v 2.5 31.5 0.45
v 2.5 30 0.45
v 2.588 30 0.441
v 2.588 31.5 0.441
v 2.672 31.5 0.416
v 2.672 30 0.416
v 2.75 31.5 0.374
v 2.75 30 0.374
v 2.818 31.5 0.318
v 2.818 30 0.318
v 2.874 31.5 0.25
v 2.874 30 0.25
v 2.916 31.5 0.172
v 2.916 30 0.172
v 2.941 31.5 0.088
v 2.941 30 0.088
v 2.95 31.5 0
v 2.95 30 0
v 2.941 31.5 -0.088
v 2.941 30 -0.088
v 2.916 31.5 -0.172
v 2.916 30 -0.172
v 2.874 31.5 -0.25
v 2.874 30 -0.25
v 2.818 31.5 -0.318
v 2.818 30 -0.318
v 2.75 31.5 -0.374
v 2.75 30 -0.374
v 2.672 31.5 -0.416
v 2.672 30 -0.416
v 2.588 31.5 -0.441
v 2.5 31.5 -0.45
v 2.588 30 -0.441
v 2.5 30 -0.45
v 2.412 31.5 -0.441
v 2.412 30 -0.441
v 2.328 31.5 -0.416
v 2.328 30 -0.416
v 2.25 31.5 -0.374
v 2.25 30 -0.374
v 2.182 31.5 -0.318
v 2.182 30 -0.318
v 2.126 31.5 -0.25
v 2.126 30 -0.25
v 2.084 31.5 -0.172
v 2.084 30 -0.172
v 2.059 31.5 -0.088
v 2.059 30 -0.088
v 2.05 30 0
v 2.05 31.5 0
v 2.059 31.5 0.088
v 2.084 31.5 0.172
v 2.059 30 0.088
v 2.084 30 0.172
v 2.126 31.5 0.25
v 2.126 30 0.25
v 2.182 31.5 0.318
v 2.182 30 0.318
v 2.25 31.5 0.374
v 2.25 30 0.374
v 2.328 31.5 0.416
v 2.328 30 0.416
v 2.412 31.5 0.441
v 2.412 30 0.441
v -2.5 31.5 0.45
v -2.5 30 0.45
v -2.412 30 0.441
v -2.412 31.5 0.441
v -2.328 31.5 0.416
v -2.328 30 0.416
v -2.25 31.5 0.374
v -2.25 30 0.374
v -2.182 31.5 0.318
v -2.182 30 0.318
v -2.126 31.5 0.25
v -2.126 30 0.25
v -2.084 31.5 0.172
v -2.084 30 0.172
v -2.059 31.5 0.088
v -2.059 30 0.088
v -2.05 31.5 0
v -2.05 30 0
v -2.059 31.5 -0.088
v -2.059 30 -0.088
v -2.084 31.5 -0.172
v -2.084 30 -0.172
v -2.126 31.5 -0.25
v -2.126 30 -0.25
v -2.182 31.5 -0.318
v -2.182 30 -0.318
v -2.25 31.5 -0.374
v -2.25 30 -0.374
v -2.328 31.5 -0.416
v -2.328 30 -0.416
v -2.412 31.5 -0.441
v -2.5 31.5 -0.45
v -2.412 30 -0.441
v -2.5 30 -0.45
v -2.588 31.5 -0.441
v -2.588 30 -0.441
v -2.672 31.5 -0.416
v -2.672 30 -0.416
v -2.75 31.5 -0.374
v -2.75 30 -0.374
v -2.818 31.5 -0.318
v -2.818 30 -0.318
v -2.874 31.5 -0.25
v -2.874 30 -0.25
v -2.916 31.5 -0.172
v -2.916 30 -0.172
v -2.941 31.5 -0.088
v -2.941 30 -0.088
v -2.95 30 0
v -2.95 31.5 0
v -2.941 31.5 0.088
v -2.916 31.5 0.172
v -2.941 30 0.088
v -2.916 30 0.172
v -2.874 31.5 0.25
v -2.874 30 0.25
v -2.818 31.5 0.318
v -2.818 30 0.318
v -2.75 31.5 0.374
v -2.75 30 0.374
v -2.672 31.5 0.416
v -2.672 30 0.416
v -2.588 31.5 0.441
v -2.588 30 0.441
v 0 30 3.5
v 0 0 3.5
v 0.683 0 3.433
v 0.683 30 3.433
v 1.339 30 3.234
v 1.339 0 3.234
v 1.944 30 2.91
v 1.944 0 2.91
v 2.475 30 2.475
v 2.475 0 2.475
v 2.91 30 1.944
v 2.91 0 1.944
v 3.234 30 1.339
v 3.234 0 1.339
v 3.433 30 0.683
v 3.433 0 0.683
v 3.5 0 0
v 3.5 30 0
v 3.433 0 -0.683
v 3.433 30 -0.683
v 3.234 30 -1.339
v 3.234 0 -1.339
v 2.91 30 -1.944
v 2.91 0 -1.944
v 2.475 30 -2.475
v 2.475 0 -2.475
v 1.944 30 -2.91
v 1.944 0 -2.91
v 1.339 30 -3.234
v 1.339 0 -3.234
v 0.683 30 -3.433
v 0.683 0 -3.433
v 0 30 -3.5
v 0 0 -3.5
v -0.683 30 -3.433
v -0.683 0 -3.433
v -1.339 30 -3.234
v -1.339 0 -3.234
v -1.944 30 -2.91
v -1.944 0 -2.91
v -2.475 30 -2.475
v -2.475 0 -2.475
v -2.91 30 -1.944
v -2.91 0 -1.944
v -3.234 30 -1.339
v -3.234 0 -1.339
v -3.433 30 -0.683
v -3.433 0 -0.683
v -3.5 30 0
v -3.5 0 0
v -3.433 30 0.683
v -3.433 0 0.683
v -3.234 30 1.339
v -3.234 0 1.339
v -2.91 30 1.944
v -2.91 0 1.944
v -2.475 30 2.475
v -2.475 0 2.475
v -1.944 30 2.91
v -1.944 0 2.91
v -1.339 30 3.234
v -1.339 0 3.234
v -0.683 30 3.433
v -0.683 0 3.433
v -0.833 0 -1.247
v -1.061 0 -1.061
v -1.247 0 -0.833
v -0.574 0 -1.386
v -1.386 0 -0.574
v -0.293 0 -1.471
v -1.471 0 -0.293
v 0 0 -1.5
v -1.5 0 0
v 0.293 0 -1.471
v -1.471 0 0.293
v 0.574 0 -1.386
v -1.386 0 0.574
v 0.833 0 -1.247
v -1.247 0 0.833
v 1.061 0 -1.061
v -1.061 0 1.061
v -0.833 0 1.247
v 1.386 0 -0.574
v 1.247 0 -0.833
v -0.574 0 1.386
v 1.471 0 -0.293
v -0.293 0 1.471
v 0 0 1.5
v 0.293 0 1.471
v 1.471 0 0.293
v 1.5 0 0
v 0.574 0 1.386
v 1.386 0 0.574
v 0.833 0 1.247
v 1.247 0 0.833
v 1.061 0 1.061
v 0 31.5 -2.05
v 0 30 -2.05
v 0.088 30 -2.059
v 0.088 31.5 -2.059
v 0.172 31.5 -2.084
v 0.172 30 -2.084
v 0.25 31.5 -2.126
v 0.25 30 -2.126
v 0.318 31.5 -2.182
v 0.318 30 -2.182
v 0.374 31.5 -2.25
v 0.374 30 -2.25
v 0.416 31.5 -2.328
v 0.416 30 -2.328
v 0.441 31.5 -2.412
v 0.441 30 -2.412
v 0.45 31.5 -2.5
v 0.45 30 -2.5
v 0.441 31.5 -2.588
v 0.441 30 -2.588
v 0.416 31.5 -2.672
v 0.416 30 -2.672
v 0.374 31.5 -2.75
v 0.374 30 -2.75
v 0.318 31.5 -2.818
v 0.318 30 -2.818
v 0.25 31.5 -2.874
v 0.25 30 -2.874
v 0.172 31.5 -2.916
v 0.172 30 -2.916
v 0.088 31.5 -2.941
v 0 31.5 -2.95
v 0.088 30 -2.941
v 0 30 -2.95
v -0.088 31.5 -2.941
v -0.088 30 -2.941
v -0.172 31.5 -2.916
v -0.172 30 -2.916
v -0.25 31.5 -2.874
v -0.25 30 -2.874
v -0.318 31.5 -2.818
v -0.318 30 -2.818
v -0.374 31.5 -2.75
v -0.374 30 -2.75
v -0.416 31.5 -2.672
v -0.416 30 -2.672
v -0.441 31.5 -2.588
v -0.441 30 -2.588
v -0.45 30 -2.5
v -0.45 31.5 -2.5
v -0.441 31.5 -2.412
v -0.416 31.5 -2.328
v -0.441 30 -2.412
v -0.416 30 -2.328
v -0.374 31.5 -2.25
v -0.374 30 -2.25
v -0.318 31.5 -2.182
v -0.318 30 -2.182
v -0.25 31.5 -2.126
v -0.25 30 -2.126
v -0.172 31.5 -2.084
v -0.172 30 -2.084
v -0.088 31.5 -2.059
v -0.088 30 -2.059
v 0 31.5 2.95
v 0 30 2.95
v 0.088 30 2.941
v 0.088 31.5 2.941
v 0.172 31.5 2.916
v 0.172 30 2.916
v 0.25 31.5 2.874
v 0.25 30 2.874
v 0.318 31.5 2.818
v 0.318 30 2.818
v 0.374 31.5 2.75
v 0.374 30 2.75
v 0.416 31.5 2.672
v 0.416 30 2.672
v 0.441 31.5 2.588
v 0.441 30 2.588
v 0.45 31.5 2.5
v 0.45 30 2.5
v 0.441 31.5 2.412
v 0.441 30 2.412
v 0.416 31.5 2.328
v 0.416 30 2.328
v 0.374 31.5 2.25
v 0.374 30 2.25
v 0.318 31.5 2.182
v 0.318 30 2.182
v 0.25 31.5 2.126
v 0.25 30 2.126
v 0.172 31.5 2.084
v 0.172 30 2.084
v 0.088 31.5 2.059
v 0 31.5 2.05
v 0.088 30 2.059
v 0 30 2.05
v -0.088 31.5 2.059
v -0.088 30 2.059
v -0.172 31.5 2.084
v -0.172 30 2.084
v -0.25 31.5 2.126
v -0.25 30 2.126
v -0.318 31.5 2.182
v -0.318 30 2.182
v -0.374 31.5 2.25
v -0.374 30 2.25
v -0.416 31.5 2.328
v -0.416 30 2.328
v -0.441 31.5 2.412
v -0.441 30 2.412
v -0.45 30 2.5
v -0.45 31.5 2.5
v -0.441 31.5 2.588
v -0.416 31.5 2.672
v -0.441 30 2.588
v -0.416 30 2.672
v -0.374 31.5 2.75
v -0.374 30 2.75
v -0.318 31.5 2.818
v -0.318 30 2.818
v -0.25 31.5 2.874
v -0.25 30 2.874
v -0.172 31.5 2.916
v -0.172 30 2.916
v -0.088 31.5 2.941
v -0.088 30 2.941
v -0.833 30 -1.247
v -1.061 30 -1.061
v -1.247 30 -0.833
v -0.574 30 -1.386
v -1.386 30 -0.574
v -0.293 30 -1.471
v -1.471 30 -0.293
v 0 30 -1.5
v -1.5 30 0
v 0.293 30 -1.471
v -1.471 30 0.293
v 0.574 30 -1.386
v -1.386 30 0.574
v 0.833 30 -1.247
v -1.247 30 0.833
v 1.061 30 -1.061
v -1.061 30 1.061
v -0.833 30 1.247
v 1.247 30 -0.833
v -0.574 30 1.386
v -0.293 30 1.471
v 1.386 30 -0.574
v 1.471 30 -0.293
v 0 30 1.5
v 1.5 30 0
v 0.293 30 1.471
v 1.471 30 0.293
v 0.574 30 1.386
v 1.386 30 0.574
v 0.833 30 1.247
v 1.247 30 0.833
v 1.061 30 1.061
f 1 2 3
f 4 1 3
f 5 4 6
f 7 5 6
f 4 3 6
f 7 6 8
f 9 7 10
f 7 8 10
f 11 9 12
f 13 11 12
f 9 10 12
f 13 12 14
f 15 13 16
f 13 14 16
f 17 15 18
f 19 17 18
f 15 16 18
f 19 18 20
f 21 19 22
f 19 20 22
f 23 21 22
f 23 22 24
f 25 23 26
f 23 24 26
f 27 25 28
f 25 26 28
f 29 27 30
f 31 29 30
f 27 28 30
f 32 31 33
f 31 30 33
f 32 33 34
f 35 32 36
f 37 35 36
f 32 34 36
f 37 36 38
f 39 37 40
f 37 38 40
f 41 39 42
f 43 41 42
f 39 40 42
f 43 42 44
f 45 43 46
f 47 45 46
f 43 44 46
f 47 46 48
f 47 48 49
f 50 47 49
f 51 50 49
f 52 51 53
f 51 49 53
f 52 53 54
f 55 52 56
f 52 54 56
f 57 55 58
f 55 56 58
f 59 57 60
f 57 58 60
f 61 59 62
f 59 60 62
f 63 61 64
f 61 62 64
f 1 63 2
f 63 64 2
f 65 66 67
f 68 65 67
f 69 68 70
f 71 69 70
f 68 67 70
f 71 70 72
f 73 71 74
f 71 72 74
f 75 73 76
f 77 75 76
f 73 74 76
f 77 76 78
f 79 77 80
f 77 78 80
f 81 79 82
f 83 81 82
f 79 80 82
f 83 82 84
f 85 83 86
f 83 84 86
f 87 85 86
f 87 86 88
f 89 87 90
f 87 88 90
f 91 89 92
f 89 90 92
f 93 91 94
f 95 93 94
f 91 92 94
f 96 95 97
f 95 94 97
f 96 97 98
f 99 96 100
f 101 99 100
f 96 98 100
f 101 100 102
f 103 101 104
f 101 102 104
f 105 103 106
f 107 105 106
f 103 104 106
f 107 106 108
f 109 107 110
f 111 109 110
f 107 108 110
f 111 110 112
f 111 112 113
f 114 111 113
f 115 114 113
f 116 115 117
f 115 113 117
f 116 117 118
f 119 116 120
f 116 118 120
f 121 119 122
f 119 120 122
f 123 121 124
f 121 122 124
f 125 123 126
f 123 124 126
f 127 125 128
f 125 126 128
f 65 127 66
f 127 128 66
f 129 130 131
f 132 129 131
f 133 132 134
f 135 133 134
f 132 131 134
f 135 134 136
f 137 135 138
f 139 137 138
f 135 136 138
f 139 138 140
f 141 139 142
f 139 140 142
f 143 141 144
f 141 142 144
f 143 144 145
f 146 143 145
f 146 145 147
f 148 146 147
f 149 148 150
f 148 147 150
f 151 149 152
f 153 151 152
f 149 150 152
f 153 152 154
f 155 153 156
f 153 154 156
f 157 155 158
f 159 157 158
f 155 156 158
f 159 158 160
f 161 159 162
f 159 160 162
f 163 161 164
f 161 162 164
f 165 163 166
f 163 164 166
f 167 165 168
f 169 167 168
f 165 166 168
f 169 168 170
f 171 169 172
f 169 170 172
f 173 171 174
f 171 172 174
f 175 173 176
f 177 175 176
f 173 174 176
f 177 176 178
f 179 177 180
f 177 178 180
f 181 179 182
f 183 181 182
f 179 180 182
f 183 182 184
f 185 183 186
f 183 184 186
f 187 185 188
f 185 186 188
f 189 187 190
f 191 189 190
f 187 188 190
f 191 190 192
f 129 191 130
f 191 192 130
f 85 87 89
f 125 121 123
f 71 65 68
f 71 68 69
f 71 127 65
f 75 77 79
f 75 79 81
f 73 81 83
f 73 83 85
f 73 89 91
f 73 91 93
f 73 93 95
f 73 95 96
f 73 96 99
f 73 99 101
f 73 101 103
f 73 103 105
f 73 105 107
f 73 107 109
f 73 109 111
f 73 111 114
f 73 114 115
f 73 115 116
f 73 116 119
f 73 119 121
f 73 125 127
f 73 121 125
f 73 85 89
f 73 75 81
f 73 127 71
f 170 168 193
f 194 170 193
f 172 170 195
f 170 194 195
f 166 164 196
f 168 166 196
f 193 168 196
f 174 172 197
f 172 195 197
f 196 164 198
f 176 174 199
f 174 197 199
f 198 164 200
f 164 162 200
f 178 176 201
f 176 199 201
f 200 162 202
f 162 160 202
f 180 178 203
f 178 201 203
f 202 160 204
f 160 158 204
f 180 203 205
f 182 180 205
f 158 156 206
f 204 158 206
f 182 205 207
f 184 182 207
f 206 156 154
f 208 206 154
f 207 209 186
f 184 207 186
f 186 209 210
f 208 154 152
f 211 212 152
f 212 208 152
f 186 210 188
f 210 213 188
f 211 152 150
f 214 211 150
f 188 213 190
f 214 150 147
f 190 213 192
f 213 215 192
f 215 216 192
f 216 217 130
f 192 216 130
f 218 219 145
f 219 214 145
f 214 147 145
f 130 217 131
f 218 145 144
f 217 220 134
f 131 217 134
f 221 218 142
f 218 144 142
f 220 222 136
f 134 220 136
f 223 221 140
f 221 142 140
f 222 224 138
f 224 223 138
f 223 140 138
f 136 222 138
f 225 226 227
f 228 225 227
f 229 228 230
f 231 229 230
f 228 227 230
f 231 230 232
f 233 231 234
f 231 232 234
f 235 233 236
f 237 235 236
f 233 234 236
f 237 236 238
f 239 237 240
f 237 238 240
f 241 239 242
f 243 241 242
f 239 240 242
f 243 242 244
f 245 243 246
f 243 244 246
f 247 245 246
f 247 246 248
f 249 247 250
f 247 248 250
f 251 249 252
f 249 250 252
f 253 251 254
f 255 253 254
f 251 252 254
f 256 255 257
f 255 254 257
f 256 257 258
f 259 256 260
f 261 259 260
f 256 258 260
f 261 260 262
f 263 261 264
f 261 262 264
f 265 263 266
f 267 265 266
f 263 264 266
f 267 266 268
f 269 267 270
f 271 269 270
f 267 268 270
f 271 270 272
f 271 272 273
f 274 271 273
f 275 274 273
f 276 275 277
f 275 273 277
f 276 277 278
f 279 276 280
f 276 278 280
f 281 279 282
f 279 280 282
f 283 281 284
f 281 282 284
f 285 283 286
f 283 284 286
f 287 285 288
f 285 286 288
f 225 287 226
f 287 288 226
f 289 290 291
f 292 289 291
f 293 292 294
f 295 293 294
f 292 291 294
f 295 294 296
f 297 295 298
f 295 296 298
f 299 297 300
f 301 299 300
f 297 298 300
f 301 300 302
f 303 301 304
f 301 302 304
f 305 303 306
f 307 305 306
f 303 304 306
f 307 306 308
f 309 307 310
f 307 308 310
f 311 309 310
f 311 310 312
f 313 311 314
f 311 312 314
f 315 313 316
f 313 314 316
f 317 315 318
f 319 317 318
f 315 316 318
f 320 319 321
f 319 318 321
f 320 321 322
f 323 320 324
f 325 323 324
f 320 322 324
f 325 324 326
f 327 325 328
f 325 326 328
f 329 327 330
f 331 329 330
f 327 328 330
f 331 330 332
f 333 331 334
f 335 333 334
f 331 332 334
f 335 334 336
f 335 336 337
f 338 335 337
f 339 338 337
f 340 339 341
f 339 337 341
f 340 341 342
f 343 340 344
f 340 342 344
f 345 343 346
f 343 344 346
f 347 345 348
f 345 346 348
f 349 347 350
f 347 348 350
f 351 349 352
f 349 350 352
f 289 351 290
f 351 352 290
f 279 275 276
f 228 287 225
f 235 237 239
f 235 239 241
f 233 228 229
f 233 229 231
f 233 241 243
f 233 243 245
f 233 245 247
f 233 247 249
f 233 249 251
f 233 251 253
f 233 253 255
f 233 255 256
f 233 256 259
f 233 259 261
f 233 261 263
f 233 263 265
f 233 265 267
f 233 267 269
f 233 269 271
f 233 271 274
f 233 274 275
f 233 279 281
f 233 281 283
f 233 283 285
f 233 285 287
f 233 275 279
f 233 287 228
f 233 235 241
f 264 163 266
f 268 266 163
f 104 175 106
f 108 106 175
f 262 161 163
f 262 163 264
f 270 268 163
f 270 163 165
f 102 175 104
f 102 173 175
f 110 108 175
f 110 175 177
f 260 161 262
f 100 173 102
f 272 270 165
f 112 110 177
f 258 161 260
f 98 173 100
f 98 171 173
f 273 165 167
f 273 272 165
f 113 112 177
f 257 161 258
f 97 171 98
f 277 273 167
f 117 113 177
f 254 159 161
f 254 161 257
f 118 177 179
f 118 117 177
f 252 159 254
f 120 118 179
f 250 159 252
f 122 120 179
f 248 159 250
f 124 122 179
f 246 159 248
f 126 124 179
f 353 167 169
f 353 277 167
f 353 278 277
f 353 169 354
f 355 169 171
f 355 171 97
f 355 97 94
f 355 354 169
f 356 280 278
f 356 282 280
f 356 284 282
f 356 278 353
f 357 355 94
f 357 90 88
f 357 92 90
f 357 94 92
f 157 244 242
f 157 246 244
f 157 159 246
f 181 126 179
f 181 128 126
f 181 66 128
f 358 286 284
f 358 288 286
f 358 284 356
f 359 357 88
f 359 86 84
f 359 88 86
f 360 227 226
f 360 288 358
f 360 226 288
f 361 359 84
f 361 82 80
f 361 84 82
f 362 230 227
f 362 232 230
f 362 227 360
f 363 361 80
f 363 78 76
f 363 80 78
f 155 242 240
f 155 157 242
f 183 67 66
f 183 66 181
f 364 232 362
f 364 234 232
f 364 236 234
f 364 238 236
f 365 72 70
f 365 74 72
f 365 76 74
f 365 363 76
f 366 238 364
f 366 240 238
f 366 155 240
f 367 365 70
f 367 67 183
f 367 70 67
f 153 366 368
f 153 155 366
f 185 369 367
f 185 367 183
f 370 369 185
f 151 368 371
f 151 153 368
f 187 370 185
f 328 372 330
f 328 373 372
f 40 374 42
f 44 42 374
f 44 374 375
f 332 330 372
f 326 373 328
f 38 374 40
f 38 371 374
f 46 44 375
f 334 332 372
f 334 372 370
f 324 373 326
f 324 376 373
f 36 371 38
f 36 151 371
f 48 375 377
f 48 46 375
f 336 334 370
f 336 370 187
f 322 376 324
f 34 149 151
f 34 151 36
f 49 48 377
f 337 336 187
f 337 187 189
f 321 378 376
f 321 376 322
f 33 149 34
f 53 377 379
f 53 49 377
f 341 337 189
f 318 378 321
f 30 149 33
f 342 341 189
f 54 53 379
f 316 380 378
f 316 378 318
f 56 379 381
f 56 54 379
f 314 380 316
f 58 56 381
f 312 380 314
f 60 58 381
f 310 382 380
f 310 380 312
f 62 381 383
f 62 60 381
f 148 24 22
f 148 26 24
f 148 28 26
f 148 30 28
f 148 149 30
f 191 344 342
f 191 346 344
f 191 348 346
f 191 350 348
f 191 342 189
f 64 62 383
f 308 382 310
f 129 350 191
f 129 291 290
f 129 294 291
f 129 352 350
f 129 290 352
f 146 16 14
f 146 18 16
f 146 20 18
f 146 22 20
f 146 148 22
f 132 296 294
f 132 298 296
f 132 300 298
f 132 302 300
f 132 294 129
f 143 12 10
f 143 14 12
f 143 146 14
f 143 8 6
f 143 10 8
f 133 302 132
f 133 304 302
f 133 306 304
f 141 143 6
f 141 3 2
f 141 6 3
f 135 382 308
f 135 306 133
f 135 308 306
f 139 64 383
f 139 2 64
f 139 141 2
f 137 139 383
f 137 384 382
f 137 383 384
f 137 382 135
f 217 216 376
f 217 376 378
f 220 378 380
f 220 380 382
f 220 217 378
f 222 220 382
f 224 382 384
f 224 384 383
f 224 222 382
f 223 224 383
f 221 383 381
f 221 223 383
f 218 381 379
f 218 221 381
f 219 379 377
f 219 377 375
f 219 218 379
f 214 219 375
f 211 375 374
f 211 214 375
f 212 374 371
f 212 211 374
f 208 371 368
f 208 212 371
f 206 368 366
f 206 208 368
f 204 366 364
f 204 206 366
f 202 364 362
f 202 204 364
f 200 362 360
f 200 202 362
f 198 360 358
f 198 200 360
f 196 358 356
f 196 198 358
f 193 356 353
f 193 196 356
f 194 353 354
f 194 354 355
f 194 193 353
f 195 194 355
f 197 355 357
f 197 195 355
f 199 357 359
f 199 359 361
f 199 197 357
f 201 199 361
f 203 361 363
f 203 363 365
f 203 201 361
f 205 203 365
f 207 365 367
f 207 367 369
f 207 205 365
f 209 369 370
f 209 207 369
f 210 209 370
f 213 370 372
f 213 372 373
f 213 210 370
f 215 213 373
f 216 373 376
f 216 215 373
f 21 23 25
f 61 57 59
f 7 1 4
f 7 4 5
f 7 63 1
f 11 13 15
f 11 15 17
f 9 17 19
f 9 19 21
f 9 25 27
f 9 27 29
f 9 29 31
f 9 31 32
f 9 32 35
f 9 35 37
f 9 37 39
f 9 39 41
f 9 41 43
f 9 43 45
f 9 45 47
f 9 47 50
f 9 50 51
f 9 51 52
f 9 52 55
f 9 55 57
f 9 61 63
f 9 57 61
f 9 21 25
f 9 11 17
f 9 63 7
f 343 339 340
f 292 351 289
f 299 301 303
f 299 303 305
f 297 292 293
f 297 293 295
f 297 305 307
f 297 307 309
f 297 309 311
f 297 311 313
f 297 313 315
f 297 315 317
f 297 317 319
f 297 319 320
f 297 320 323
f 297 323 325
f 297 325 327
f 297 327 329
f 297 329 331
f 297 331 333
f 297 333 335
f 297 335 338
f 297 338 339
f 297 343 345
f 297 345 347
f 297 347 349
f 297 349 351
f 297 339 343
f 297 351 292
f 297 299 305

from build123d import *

# Parameters (mm, degrees)
SKETCH_1_R      = 3.5
SKETCH_1_R_2    = 1.5
EXTRUDE_2_DEPTH = 30
SKETCH_3_R      = 0.45
EXTRUDE_4_DEPTH = 1.5


with BuildPart() as part:
    # 草图1 → 凸台-拉伸2 (new body)
    with BuildSketch(Plane(origin=(0, 0, 0), x_dir=(1, 0, 0), z_dir=(0, 1, 0))):
        with Locations(Location((0, 0, 0), (0, 0, 270))):
            Circle(SKETCH_1_R)
        with Locations(Location((0, 0, 0), (0, 0, 270))):
            Circle(SKETCH_1_R_2, mode=Mode.SUBTRACT)
    extrude(amount=EXTRUDE_2_DEPTH)

    # 草图3 → 凸台-拉伸4 (add)
    with BuildSketch(Plane(origin=(0, 30, 0), x_dir=(1, 0, 0), z_dir=(0, 1, 0))):
        with Locations(Location((0, 2.5, 0), (0, 0, 270))):
            Circle(SKETCH_3_R)
        with Locations(Location((2.5, 0, 0), (0, 0, 270))):
            Circle(SKETCH_3_R)
        with Locations(Location((0, -2.5, 0), (0, 0, 270))):
            Circle(SKETCH_3_R)
        with Locations(Location((-2.5, 0, 0), (0, 0, 270))):
            Circle(SKETCH_3_R)
    extrude(amount=EXTRUDE_4_DEPTH)


solid = part.part
